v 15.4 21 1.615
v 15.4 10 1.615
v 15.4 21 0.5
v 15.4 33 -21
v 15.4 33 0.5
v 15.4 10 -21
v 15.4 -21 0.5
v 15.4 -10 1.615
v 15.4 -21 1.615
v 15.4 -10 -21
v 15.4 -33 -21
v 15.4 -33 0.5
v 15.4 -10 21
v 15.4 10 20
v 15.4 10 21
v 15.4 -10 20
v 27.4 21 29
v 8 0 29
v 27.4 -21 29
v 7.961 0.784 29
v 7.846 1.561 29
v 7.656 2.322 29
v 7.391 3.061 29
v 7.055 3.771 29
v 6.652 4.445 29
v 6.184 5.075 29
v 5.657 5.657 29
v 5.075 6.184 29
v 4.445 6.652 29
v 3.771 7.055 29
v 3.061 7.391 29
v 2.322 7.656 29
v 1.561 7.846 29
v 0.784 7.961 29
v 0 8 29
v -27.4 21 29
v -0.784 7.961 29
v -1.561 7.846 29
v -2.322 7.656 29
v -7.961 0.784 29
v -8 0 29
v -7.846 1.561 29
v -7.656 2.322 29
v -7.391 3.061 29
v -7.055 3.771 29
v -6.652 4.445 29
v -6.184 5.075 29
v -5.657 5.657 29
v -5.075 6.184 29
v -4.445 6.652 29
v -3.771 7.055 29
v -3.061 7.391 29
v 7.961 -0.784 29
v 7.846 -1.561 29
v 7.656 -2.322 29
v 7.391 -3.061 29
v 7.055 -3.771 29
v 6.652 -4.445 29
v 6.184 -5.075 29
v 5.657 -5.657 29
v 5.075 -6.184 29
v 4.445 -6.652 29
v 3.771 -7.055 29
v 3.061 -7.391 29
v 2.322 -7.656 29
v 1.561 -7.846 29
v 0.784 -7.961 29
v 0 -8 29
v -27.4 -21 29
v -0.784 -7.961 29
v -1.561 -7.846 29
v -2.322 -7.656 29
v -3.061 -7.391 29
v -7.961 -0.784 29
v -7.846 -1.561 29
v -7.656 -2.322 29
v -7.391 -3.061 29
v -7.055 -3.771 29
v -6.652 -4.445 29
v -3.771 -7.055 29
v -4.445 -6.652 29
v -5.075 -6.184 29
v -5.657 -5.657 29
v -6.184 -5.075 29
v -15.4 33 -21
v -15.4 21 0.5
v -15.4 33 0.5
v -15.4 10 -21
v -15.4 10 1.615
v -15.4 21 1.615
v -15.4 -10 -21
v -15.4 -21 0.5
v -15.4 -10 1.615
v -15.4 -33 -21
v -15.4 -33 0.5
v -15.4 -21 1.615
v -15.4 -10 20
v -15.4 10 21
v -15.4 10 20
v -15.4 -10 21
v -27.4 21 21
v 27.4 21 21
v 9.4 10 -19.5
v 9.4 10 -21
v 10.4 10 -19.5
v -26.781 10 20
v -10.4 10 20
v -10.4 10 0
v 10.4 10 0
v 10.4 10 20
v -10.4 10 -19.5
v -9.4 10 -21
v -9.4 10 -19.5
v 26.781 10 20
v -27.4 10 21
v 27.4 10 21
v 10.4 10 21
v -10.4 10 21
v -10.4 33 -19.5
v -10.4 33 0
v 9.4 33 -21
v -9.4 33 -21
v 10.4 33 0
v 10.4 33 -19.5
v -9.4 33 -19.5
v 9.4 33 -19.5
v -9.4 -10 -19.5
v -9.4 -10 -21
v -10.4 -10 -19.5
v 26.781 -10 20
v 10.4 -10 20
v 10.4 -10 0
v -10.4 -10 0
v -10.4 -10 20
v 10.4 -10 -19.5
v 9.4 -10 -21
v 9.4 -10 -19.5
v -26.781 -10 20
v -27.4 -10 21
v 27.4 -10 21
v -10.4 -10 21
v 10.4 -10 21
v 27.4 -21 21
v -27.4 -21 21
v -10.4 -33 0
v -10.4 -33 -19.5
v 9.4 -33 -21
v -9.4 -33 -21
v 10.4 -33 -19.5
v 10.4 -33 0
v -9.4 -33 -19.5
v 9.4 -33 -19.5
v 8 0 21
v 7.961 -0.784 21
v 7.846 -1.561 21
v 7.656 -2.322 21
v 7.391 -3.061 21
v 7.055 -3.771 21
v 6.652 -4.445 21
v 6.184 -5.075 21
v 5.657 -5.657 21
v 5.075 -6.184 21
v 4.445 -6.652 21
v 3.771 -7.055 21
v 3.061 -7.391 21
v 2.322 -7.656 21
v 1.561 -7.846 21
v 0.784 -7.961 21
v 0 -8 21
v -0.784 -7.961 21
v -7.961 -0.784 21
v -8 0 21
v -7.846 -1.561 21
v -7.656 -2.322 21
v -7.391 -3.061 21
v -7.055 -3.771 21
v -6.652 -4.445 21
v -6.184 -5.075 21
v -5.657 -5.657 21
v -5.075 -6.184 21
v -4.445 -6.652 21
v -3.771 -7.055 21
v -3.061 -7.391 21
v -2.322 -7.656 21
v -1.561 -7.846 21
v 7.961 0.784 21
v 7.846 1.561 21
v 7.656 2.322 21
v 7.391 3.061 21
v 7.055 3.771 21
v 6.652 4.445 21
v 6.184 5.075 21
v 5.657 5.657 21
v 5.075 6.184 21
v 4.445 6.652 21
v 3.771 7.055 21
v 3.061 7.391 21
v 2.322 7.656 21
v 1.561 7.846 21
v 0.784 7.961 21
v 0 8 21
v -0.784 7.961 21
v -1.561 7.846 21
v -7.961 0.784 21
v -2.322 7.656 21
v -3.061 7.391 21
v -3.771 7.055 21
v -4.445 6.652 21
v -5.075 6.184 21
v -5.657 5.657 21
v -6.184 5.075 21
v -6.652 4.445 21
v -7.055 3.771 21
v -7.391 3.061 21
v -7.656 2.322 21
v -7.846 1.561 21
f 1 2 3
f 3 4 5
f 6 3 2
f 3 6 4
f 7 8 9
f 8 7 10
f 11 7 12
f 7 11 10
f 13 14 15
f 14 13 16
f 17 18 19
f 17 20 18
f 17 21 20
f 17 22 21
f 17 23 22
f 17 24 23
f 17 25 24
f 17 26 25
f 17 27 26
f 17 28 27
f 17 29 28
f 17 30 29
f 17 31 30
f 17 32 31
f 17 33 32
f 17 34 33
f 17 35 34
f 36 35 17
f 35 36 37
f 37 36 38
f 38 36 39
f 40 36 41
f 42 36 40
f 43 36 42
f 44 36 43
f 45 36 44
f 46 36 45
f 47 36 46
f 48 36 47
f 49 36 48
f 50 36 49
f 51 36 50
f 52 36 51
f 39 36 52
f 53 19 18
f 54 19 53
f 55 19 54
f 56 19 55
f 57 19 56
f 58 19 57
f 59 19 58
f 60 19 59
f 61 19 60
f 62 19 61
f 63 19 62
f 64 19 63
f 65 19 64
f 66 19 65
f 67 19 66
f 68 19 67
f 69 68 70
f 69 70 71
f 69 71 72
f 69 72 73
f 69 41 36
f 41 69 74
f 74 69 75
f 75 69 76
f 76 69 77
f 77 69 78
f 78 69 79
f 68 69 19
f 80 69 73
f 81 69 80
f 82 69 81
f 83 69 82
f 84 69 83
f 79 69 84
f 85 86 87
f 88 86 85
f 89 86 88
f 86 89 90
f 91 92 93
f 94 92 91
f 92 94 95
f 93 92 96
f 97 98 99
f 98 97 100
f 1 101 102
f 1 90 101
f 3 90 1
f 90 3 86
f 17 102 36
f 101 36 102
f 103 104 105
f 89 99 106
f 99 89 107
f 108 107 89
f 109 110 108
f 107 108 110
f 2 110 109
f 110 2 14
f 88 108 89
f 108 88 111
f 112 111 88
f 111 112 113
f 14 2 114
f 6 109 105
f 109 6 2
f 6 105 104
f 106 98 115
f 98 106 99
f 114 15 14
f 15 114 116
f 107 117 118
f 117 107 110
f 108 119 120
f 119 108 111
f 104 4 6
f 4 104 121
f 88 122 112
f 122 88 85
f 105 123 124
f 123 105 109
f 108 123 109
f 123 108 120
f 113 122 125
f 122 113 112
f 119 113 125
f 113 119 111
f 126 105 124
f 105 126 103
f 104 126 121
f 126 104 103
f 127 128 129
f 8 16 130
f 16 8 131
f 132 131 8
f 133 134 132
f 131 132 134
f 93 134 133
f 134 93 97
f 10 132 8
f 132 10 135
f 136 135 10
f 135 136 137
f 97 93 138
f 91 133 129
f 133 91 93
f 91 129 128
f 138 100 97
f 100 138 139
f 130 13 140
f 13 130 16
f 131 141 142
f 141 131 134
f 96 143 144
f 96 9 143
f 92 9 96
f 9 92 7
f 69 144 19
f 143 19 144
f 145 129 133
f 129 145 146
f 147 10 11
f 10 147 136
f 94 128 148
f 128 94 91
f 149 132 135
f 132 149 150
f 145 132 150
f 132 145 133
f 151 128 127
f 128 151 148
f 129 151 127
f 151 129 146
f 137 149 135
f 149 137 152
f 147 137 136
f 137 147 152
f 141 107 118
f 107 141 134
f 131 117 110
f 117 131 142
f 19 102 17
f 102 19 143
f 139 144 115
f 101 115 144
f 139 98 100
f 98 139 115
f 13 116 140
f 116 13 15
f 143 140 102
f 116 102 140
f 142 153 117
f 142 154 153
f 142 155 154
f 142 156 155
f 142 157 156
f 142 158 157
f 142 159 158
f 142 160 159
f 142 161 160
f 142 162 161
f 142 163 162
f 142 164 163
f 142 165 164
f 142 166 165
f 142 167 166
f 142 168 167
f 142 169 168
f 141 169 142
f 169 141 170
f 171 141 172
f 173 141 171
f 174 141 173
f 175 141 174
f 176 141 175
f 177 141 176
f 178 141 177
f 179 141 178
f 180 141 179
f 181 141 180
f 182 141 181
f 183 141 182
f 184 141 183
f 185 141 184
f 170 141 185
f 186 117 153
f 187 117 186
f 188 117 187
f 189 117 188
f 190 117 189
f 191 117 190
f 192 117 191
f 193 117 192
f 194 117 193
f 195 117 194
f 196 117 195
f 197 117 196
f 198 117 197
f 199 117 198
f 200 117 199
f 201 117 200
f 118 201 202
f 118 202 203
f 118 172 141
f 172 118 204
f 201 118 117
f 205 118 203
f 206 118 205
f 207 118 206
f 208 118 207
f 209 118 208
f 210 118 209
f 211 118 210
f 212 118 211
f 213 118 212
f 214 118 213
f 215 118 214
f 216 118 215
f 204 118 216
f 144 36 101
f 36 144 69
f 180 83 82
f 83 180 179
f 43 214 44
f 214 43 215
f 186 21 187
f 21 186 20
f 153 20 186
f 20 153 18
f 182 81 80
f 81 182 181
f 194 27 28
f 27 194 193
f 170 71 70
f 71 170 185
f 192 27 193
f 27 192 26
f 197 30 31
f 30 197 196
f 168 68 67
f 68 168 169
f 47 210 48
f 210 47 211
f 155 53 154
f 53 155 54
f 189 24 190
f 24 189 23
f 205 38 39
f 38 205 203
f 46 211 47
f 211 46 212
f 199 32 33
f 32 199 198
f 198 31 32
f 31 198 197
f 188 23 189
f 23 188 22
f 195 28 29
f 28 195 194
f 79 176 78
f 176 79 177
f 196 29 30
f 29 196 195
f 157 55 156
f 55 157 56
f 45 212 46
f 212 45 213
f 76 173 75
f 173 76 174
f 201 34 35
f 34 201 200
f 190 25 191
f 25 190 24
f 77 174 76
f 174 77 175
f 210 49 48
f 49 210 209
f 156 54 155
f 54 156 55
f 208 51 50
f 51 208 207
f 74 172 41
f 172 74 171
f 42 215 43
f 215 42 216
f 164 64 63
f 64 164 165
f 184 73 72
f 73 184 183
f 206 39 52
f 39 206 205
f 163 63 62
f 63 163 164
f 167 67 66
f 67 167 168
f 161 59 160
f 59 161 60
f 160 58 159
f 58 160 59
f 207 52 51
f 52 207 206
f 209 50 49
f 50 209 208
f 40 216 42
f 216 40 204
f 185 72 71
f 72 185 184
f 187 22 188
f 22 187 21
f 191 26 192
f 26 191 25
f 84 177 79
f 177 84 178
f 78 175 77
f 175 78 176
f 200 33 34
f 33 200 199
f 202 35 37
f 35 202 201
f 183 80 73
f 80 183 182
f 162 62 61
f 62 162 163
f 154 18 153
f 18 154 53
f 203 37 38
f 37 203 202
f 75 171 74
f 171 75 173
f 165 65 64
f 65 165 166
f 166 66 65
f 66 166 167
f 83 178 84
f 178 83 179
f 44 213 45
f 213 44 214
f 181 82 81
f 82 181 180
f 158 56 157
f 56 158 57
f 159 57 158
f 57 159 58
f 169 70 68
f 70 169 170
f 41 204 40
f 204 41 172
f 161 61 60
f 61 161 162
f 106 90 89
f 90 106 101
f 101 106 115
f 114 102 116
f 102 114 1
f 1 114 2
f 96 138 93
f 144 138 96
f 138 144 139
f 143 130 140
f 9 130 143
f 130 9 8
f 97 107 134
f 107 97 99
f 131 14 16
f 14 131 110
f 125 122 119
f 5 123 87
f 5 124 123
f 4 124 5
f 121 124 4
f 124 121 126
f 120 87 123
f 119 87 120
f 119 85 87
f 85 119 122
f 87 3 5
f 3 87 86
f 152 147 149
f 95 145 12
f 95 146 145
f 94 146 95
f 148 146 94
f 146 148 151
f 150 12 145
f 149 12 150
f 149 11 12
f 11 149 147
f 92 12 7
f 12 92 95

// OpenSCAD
// file: ../perpendicular-u-joint-guard-v1.3-triangular-corner-fills/candidate_triangular_corner_fills.scad
// Candidate v1.3: four triangular concave-corner fill blocks.
//
// Base: accepted v0.7 eaves12 geometry. v0.9/v1.0/v1.1/v1.2 are not
// imported. Each corner block is a real triangular prism: broad at the roof,
// tapering continuously toward z=0, and overlapping the U side wall.

use <../perpendicular-u-joint-guard-v0.7/perpendicular_double_u_guard.scad>;

$fn = 48;
PART = "candidate_iso";

// Explicit v0.7 interface values.
roof_x_outer = 27.4;       // accepted eaves12 roof: -27.4..+27.4
side_wall_x_outer = 15.4;  // existing side-wall outer edge
blue_tube_x_outer = 10.0;  // blue lower 20x20 tube half-width
plate_y_inner = 10.0;
plate_y_outer = 21.0;
plate_depth_y = plate_y_outer - plate_y_inner; // 11 mm per front/back U plate

// The top edge is 0.5 mm inside the roof volume (roof underside z=21), and
// the lower point enters the side wall by 1 mm in X.  The XZ area therefore
// has positive overlap at both ends, not edge-only contact.
triangle_top_z = 21.5;
triangle_bottom_z = 0.0;
triangle_roof_overlap_z = triangle_top_z - 21.0;
triangle_side_overlap_x = 1.0;
triangle_inner_x = side_wall_x_outer - triangle_side_overlap_x; // 14.4

// Bottom retaining-hook contract copied from v0.7 for explicit verification.
hook_height_z = 1.5;
u_bottom_z = -21.0;
hook_top_z = u_bottom_z + hook_height_z; // -19.5

assert(plate_depth_y == 11, "每个三角块的前后板深必须是 11 mm");
assert(triangle_top_z > 21 && triangle_bottom_z == 0,
       "三角块上端必须搭入屋檐、下端落到 z=0");
assert(triangle_inner_x > blue_tube_x_outer,
       "三角块下端不得进入蓝色方管 x=-10..+10 包络");
assert(triangle_side_overlap_x > 0 && triangle_roof_overlap_z > 0,
       "三角块必须与屋檐和侧墙都有正重叠");
assert(hook_height_z == 1.5 && u_bottom_z == -21 && hook_top_z == -19.5,
       "底部卡脚必须保持 z=-21..-19.5");

// A polygon in XZ is extruded only through the corresponding front/back U
// plate. The center y=-10..+10 passage remains open.
module triangular_fill_xz(points, yc) {
    translate([0, yc, 0])
        rotate([90, 0, 0])
            linear_extrude(height = plate_depth_y,
                           center = true,
                           convexity = 10)
                polygon(points = points);
}

module front_neg_x_triangle() {
    // -X roof end -> +X inward. Top wide, lower point at the side wall.
    triangular_fill_xz([
        [-roof_x_outer, 21.0],
        [-triangle_inner_x, triangle_top_z],
        [-triangle_inner_x, triangle_bottom_z]
    ], (plate_y_inner + plate_y_outer) / 2);
}

module front_pos_x_triangle() {
    // +X roof end -> -X inward. Mirrored triangle.
    triangular_fill_xz([
        [roof_x_outer, 21.0],
        [triangle_inner_x, triangle_top_z],
        [triangle_inner_x, triangle_bottom_z]
    ], (plate_y_inner + plate_y_outer) / 2);
}

module back_neg_x_triangle() {
    triangular_fill_xz([
        [-roof_x_outer, 21.0],
        [-triangle_inner_x, triangle_top_z],
        [-triangle_inner_x, triangle_bottom_z]
    ], -(plate_y_inner + plate_y_outer) / 2);
}

module back_pos_x_triangle() {
    triangular_fill_xz([
        [roof_x_outer, 21.0],
        [triangle_inner_x, triangle_top_z],
        [triangle_inner_x, triangle_bottom_z]
    ], -(plate_y_inner + plate_y_outer) / 2);
}

module front_two_triangular_fills() {
    union() {
        front_neg_x_triangle();
        front_pos_x_triangle();
    }
}

module back_two_triangular_fills() {
    union() {
        back_neg_x_triangle();
        back_pos_x_triangle();
    }
}

module all_four_triangular_fills() {
    union() {
        front_two_triangular_fills();
        back_two_triangular_fills();
    }
}

module candidate_print_solid() {
    // Final hole operation is deliberately after the complete four-block
    // union; this preserves a true Z through-hole and the round nut pocket.
    difference() {
        union() {
            double_u_clip();
            all_four_triangular_fills();
        }
        vertical_screw_relief();
    }
}

module candidate_clip() {
    candidate_print_solid();
}

module candidate_assembly_iso() {
    upper_long_tube();
    lower_cross_tube();
    color([0.96, 0.39, 0.08]) double_u_clip();
    color([0.86, 0.13, 0.08]) front_two_triangular_fills();
    color([0.62, 0.12, 0.52]) back_two_triangular_fills();
    vertical_joint_screw();
}

module candidate_front_xz() {
    lower_cross_tube();
    color([0.96, 0.39, 0.08]) double_u_clip();
    color([0.86, 0.13, 0.08]) front_two_triangular_fills();
    vertical_joint_screw();
}

module candidate_back_xz() {
    lower_cross_tube();
    color([0.96, 0.39, 0.08]) double_u_clip();
    color([0.62, 0.12, 0.52]) back_two_triangular_fills();
    vertical_joint_screw();
}

module candidate_top_slice() {
    // At z=-0.5..2.5 the four blocks show their two front/back 11 mm bands;
    // the blue tube and the central y gap remain visible.
    slice_box = 200;
    color([0.28, 0.45, 0.78])
        intersection() {
            lower_cross_tube();
            translate([-slice_box / 2, -slice_box / 2, -0.5])
                cube([slice_box, slice_box, 3.0]);
        }
    color([0.96, 0.39, 0.08])
        intersection() {
            double_u_clip();
            translate([-slice_box / 2, -slice_box / 2, -0.5])
                cube([slice_box, slice_box, 3.0]);
        }
    color([0.86, 0.13, 0.08])
        intersection() {
            front_two_triangular_fills();
            translate([-slice_box / 2, -slice_box / 2, -0.5])
                cube([slice_box, slice_box, 3.0]);
        }
    color([0.62, 0.12, 0.52])
        intersection() {
            back_two_triangular_fills();
            translate([-slice_box / 2, -slice_box / 2, -0.5])
                cube([slice_box, slice_box, 3.0]);
        }
}

module candidate_hole_section() {
    // Center y=0 section: the bore and round nut pocket are shown without
    // confusing them with the bottom hook, which is outside this section.
    intersection() {
        candidate_print_solid();
        translate([-100, -0.4, -100]) cube([200, 0.8, 200]);
    }
}

module candidate_hook_check() {
    // Isolated lower detail: exact imported v0.7 U plate and blue tube, with
    // hook volumes highlighted only for review. This is not the print union.
    detail_box = 200;
    detail_z0 = -22;
    detail_h = 5;
    detail_y0 = 8;
    detail_ydepth = 15;
    intersection() {
        lower_cross_tube();
        translate([-detail_box / 2, detail_y0, detail_z0])
            cube([detail_box, detail_ydepth, detail_h]);
    }
    color([0.96, 0.39, 0.08])
        intersection() {
            u_plate(plate_y_inner, plate_y_outer);
            translate([-detail_box / 2, detail_y0, detail_z0])
                cube([detail_box, detail_ydepth, detail_h]);
        }
    color([0.20, 0.78, 0.20])
        intersection() {
            union() {
                translate([-13.65, 15.5, -20.25])
                    cube([3.5, 11, 1.5], center = true);
                translate([13.65, 15.5, -20.25])
                    cube([3.5, 11, 1.5], center = true);
            }
            translate([-detail_box / 2, detail_y0, detail_z0])
                cube([detail_box, detail_ydepth, detail_h]);
        }
}

if (PART == "candidate_clip") {
    candidate_clip();
} else if (PART == "candidate_front_xz") {
    candidate_front_xz();
} else if (PART == "candidate_back_xz") {
    candidate_back_xz();
} else if (PART == "candidate_top_slice") {
    candidate_top_slice();
} else if (PART == "candidate_hole_section") {
    candidate_hole_section();
} else if (PART == "candidate_hook_check") {
    candidate_hook_check();
} else {
    candidate_assembly_iso();
}
// file: ../perpendicular-u-joint-guard-v1.4-full-nut-passage/full_nut_passage_guard.scad
// v1.4: keep the exact v1.3 body; remove the nut-pocket floor with one
// full-depth Ø16 cylindrical subtraction. Units: mm; Z positive upwards.
// Imported v1.3 geometry contains all four triangles and the lower hooks.
use <../perpendicular-u-joint-guard-v1.3-triangular-corner-fills/candidate_triangular_corner_fills.scad>;

$fn = 48;
PART = "clip";
nut_passage_d = 16.0;

module full_depth_nut_passage() {
    // Cutter extends z=-31..39, past the whole printed z=-21..29 envelope.
    // 64 facets match the existing Ø16 pocket, avoiding a stepped profile.
    translate([0, 0, 4])
        cylinder(d = nut_passage_d, h = 70, center = true, $fn = 64);
}

module guard_v1_4() {
    difference() {
        candidate_print_solid();
        full_depth_nut_passage();
    }
}

guard_v1_4();
// file: ../perpendicular-u-joint-guard-v1.5-vertical-tube-clearance/vertical_tube_clearance_guard.scad
// v1.5: v1.4 Ø16 full nut passage + minimum downward-entry upper-tube slot.
// Units mm. X: upper long tube; Y: blue foot/front-back; Z: up.
use <../perpendicular-u-joint-guard-v1.4-full-nut-passage/full_nut_passage_guard.scad>;

$fn = 48;

module upper_pipe_vertical_entry_slot() {
    // Fixed gray upper tube: x=-60..60, y=-10..10, z=0..20.
    // While the clip moves down, that tube sweeps upward in clip coordinates.
    // A bottom-open slot ending at z=20 covers its whole relevant sweep in
    // the printed z=-21..29 envelope. Roof underside remains at z=21.
    // Preserve exact 20 mm Y width rather than silently adding fit clearance.
    translate([-60, -10, -31]) cube([120, 20, 51]);
}

module guard_v1_5() {
    difference() {
        guard_v1_4();
        upper_pipe_vertical_entry_slot();
    }
}

guard_v1_5();
// main file
// v1.7 candidate, mm: prolong the original U/retaining-hook cross-section
// along the BLUE LOWER TUBE axis Y. No v1.6 geometry is imported.
// Front U: y=10..33; rear U: y=-33..-10. Original inner faces stay +/-10.
// Lower extension range: z=-21..+0.5, height 21.5. Physical tubes and original
// hook z=-21..-19.5 are unchanged. The top 0.5 mm reuses the original upper
// web transition in u_plate(), i.e. the same profile throughout the new span.
use <../perpendicular-u-joint-guard-v1.5-vertical-tube-clearance/vertical_tube_clearance_guard.scad>;
use <../perpendicular-u-joint-guard-v1.4-full-nut-passage/full_nut_passage_guard.scad>;
use <../perpendicular-u-joint-guard-v0.7/perpendicular_double_u_guard.scad>;

$fn = 48;
outer_y_extension = 12;
lower_u_inner_y = 10;
original_lower_u_outer_y = 21;
lower_u_outer_y = original_lower_u_outer_y + outer_y_extension; // 33
lower_segment_bottom_z = -21;
lower_segment_top_z = 0.5;

assert(2*lower_u_inner_y == 20, "中央通道应保持 20 mm");
assert(lower_segment_top_z-lower_segment_bottom_z == 21.5,
       "连续延长段必须覆盖 Z=-21..+0.5，共21.5 mm");

module prolonged_lower_u(y0, y1) {
    // One uninterrupted extrusion over the WHOLE new U-plate depth, not a
    // pair of external substitute blocks. u_plate() is the original model's
    // authoritative cross-section, including its actual inward lower hooks.
    intersection() {
        u_plate(y0, y1);
        translate([-40,-40,lower_segment_bottom_z])
            cube([80,80,lower_segment_top_z-lower_segment_bottom_z]);
    }
}

module continuous_lower_u_pair() {
    prolonged_lower_u(lower_u_inner_y, lower_u_outer_y);
    prolonged_lower_u(-lower_u_outer_y, -lower_u_inner_y);
}

module guard_v1_7() {
    difference() {
        union() {
            guard_v1_5();
            // Original 11 mm and new 12 mm spans are evaluated as a single
            // 23 mm-deep U profile; overlap with the original is volumetric.
            continuous_lower_u_pair();
        }
        full_depth_nut_passage();
        upper_pipe_vertical_entry_slot();
    }
}

guard_v1_7();
